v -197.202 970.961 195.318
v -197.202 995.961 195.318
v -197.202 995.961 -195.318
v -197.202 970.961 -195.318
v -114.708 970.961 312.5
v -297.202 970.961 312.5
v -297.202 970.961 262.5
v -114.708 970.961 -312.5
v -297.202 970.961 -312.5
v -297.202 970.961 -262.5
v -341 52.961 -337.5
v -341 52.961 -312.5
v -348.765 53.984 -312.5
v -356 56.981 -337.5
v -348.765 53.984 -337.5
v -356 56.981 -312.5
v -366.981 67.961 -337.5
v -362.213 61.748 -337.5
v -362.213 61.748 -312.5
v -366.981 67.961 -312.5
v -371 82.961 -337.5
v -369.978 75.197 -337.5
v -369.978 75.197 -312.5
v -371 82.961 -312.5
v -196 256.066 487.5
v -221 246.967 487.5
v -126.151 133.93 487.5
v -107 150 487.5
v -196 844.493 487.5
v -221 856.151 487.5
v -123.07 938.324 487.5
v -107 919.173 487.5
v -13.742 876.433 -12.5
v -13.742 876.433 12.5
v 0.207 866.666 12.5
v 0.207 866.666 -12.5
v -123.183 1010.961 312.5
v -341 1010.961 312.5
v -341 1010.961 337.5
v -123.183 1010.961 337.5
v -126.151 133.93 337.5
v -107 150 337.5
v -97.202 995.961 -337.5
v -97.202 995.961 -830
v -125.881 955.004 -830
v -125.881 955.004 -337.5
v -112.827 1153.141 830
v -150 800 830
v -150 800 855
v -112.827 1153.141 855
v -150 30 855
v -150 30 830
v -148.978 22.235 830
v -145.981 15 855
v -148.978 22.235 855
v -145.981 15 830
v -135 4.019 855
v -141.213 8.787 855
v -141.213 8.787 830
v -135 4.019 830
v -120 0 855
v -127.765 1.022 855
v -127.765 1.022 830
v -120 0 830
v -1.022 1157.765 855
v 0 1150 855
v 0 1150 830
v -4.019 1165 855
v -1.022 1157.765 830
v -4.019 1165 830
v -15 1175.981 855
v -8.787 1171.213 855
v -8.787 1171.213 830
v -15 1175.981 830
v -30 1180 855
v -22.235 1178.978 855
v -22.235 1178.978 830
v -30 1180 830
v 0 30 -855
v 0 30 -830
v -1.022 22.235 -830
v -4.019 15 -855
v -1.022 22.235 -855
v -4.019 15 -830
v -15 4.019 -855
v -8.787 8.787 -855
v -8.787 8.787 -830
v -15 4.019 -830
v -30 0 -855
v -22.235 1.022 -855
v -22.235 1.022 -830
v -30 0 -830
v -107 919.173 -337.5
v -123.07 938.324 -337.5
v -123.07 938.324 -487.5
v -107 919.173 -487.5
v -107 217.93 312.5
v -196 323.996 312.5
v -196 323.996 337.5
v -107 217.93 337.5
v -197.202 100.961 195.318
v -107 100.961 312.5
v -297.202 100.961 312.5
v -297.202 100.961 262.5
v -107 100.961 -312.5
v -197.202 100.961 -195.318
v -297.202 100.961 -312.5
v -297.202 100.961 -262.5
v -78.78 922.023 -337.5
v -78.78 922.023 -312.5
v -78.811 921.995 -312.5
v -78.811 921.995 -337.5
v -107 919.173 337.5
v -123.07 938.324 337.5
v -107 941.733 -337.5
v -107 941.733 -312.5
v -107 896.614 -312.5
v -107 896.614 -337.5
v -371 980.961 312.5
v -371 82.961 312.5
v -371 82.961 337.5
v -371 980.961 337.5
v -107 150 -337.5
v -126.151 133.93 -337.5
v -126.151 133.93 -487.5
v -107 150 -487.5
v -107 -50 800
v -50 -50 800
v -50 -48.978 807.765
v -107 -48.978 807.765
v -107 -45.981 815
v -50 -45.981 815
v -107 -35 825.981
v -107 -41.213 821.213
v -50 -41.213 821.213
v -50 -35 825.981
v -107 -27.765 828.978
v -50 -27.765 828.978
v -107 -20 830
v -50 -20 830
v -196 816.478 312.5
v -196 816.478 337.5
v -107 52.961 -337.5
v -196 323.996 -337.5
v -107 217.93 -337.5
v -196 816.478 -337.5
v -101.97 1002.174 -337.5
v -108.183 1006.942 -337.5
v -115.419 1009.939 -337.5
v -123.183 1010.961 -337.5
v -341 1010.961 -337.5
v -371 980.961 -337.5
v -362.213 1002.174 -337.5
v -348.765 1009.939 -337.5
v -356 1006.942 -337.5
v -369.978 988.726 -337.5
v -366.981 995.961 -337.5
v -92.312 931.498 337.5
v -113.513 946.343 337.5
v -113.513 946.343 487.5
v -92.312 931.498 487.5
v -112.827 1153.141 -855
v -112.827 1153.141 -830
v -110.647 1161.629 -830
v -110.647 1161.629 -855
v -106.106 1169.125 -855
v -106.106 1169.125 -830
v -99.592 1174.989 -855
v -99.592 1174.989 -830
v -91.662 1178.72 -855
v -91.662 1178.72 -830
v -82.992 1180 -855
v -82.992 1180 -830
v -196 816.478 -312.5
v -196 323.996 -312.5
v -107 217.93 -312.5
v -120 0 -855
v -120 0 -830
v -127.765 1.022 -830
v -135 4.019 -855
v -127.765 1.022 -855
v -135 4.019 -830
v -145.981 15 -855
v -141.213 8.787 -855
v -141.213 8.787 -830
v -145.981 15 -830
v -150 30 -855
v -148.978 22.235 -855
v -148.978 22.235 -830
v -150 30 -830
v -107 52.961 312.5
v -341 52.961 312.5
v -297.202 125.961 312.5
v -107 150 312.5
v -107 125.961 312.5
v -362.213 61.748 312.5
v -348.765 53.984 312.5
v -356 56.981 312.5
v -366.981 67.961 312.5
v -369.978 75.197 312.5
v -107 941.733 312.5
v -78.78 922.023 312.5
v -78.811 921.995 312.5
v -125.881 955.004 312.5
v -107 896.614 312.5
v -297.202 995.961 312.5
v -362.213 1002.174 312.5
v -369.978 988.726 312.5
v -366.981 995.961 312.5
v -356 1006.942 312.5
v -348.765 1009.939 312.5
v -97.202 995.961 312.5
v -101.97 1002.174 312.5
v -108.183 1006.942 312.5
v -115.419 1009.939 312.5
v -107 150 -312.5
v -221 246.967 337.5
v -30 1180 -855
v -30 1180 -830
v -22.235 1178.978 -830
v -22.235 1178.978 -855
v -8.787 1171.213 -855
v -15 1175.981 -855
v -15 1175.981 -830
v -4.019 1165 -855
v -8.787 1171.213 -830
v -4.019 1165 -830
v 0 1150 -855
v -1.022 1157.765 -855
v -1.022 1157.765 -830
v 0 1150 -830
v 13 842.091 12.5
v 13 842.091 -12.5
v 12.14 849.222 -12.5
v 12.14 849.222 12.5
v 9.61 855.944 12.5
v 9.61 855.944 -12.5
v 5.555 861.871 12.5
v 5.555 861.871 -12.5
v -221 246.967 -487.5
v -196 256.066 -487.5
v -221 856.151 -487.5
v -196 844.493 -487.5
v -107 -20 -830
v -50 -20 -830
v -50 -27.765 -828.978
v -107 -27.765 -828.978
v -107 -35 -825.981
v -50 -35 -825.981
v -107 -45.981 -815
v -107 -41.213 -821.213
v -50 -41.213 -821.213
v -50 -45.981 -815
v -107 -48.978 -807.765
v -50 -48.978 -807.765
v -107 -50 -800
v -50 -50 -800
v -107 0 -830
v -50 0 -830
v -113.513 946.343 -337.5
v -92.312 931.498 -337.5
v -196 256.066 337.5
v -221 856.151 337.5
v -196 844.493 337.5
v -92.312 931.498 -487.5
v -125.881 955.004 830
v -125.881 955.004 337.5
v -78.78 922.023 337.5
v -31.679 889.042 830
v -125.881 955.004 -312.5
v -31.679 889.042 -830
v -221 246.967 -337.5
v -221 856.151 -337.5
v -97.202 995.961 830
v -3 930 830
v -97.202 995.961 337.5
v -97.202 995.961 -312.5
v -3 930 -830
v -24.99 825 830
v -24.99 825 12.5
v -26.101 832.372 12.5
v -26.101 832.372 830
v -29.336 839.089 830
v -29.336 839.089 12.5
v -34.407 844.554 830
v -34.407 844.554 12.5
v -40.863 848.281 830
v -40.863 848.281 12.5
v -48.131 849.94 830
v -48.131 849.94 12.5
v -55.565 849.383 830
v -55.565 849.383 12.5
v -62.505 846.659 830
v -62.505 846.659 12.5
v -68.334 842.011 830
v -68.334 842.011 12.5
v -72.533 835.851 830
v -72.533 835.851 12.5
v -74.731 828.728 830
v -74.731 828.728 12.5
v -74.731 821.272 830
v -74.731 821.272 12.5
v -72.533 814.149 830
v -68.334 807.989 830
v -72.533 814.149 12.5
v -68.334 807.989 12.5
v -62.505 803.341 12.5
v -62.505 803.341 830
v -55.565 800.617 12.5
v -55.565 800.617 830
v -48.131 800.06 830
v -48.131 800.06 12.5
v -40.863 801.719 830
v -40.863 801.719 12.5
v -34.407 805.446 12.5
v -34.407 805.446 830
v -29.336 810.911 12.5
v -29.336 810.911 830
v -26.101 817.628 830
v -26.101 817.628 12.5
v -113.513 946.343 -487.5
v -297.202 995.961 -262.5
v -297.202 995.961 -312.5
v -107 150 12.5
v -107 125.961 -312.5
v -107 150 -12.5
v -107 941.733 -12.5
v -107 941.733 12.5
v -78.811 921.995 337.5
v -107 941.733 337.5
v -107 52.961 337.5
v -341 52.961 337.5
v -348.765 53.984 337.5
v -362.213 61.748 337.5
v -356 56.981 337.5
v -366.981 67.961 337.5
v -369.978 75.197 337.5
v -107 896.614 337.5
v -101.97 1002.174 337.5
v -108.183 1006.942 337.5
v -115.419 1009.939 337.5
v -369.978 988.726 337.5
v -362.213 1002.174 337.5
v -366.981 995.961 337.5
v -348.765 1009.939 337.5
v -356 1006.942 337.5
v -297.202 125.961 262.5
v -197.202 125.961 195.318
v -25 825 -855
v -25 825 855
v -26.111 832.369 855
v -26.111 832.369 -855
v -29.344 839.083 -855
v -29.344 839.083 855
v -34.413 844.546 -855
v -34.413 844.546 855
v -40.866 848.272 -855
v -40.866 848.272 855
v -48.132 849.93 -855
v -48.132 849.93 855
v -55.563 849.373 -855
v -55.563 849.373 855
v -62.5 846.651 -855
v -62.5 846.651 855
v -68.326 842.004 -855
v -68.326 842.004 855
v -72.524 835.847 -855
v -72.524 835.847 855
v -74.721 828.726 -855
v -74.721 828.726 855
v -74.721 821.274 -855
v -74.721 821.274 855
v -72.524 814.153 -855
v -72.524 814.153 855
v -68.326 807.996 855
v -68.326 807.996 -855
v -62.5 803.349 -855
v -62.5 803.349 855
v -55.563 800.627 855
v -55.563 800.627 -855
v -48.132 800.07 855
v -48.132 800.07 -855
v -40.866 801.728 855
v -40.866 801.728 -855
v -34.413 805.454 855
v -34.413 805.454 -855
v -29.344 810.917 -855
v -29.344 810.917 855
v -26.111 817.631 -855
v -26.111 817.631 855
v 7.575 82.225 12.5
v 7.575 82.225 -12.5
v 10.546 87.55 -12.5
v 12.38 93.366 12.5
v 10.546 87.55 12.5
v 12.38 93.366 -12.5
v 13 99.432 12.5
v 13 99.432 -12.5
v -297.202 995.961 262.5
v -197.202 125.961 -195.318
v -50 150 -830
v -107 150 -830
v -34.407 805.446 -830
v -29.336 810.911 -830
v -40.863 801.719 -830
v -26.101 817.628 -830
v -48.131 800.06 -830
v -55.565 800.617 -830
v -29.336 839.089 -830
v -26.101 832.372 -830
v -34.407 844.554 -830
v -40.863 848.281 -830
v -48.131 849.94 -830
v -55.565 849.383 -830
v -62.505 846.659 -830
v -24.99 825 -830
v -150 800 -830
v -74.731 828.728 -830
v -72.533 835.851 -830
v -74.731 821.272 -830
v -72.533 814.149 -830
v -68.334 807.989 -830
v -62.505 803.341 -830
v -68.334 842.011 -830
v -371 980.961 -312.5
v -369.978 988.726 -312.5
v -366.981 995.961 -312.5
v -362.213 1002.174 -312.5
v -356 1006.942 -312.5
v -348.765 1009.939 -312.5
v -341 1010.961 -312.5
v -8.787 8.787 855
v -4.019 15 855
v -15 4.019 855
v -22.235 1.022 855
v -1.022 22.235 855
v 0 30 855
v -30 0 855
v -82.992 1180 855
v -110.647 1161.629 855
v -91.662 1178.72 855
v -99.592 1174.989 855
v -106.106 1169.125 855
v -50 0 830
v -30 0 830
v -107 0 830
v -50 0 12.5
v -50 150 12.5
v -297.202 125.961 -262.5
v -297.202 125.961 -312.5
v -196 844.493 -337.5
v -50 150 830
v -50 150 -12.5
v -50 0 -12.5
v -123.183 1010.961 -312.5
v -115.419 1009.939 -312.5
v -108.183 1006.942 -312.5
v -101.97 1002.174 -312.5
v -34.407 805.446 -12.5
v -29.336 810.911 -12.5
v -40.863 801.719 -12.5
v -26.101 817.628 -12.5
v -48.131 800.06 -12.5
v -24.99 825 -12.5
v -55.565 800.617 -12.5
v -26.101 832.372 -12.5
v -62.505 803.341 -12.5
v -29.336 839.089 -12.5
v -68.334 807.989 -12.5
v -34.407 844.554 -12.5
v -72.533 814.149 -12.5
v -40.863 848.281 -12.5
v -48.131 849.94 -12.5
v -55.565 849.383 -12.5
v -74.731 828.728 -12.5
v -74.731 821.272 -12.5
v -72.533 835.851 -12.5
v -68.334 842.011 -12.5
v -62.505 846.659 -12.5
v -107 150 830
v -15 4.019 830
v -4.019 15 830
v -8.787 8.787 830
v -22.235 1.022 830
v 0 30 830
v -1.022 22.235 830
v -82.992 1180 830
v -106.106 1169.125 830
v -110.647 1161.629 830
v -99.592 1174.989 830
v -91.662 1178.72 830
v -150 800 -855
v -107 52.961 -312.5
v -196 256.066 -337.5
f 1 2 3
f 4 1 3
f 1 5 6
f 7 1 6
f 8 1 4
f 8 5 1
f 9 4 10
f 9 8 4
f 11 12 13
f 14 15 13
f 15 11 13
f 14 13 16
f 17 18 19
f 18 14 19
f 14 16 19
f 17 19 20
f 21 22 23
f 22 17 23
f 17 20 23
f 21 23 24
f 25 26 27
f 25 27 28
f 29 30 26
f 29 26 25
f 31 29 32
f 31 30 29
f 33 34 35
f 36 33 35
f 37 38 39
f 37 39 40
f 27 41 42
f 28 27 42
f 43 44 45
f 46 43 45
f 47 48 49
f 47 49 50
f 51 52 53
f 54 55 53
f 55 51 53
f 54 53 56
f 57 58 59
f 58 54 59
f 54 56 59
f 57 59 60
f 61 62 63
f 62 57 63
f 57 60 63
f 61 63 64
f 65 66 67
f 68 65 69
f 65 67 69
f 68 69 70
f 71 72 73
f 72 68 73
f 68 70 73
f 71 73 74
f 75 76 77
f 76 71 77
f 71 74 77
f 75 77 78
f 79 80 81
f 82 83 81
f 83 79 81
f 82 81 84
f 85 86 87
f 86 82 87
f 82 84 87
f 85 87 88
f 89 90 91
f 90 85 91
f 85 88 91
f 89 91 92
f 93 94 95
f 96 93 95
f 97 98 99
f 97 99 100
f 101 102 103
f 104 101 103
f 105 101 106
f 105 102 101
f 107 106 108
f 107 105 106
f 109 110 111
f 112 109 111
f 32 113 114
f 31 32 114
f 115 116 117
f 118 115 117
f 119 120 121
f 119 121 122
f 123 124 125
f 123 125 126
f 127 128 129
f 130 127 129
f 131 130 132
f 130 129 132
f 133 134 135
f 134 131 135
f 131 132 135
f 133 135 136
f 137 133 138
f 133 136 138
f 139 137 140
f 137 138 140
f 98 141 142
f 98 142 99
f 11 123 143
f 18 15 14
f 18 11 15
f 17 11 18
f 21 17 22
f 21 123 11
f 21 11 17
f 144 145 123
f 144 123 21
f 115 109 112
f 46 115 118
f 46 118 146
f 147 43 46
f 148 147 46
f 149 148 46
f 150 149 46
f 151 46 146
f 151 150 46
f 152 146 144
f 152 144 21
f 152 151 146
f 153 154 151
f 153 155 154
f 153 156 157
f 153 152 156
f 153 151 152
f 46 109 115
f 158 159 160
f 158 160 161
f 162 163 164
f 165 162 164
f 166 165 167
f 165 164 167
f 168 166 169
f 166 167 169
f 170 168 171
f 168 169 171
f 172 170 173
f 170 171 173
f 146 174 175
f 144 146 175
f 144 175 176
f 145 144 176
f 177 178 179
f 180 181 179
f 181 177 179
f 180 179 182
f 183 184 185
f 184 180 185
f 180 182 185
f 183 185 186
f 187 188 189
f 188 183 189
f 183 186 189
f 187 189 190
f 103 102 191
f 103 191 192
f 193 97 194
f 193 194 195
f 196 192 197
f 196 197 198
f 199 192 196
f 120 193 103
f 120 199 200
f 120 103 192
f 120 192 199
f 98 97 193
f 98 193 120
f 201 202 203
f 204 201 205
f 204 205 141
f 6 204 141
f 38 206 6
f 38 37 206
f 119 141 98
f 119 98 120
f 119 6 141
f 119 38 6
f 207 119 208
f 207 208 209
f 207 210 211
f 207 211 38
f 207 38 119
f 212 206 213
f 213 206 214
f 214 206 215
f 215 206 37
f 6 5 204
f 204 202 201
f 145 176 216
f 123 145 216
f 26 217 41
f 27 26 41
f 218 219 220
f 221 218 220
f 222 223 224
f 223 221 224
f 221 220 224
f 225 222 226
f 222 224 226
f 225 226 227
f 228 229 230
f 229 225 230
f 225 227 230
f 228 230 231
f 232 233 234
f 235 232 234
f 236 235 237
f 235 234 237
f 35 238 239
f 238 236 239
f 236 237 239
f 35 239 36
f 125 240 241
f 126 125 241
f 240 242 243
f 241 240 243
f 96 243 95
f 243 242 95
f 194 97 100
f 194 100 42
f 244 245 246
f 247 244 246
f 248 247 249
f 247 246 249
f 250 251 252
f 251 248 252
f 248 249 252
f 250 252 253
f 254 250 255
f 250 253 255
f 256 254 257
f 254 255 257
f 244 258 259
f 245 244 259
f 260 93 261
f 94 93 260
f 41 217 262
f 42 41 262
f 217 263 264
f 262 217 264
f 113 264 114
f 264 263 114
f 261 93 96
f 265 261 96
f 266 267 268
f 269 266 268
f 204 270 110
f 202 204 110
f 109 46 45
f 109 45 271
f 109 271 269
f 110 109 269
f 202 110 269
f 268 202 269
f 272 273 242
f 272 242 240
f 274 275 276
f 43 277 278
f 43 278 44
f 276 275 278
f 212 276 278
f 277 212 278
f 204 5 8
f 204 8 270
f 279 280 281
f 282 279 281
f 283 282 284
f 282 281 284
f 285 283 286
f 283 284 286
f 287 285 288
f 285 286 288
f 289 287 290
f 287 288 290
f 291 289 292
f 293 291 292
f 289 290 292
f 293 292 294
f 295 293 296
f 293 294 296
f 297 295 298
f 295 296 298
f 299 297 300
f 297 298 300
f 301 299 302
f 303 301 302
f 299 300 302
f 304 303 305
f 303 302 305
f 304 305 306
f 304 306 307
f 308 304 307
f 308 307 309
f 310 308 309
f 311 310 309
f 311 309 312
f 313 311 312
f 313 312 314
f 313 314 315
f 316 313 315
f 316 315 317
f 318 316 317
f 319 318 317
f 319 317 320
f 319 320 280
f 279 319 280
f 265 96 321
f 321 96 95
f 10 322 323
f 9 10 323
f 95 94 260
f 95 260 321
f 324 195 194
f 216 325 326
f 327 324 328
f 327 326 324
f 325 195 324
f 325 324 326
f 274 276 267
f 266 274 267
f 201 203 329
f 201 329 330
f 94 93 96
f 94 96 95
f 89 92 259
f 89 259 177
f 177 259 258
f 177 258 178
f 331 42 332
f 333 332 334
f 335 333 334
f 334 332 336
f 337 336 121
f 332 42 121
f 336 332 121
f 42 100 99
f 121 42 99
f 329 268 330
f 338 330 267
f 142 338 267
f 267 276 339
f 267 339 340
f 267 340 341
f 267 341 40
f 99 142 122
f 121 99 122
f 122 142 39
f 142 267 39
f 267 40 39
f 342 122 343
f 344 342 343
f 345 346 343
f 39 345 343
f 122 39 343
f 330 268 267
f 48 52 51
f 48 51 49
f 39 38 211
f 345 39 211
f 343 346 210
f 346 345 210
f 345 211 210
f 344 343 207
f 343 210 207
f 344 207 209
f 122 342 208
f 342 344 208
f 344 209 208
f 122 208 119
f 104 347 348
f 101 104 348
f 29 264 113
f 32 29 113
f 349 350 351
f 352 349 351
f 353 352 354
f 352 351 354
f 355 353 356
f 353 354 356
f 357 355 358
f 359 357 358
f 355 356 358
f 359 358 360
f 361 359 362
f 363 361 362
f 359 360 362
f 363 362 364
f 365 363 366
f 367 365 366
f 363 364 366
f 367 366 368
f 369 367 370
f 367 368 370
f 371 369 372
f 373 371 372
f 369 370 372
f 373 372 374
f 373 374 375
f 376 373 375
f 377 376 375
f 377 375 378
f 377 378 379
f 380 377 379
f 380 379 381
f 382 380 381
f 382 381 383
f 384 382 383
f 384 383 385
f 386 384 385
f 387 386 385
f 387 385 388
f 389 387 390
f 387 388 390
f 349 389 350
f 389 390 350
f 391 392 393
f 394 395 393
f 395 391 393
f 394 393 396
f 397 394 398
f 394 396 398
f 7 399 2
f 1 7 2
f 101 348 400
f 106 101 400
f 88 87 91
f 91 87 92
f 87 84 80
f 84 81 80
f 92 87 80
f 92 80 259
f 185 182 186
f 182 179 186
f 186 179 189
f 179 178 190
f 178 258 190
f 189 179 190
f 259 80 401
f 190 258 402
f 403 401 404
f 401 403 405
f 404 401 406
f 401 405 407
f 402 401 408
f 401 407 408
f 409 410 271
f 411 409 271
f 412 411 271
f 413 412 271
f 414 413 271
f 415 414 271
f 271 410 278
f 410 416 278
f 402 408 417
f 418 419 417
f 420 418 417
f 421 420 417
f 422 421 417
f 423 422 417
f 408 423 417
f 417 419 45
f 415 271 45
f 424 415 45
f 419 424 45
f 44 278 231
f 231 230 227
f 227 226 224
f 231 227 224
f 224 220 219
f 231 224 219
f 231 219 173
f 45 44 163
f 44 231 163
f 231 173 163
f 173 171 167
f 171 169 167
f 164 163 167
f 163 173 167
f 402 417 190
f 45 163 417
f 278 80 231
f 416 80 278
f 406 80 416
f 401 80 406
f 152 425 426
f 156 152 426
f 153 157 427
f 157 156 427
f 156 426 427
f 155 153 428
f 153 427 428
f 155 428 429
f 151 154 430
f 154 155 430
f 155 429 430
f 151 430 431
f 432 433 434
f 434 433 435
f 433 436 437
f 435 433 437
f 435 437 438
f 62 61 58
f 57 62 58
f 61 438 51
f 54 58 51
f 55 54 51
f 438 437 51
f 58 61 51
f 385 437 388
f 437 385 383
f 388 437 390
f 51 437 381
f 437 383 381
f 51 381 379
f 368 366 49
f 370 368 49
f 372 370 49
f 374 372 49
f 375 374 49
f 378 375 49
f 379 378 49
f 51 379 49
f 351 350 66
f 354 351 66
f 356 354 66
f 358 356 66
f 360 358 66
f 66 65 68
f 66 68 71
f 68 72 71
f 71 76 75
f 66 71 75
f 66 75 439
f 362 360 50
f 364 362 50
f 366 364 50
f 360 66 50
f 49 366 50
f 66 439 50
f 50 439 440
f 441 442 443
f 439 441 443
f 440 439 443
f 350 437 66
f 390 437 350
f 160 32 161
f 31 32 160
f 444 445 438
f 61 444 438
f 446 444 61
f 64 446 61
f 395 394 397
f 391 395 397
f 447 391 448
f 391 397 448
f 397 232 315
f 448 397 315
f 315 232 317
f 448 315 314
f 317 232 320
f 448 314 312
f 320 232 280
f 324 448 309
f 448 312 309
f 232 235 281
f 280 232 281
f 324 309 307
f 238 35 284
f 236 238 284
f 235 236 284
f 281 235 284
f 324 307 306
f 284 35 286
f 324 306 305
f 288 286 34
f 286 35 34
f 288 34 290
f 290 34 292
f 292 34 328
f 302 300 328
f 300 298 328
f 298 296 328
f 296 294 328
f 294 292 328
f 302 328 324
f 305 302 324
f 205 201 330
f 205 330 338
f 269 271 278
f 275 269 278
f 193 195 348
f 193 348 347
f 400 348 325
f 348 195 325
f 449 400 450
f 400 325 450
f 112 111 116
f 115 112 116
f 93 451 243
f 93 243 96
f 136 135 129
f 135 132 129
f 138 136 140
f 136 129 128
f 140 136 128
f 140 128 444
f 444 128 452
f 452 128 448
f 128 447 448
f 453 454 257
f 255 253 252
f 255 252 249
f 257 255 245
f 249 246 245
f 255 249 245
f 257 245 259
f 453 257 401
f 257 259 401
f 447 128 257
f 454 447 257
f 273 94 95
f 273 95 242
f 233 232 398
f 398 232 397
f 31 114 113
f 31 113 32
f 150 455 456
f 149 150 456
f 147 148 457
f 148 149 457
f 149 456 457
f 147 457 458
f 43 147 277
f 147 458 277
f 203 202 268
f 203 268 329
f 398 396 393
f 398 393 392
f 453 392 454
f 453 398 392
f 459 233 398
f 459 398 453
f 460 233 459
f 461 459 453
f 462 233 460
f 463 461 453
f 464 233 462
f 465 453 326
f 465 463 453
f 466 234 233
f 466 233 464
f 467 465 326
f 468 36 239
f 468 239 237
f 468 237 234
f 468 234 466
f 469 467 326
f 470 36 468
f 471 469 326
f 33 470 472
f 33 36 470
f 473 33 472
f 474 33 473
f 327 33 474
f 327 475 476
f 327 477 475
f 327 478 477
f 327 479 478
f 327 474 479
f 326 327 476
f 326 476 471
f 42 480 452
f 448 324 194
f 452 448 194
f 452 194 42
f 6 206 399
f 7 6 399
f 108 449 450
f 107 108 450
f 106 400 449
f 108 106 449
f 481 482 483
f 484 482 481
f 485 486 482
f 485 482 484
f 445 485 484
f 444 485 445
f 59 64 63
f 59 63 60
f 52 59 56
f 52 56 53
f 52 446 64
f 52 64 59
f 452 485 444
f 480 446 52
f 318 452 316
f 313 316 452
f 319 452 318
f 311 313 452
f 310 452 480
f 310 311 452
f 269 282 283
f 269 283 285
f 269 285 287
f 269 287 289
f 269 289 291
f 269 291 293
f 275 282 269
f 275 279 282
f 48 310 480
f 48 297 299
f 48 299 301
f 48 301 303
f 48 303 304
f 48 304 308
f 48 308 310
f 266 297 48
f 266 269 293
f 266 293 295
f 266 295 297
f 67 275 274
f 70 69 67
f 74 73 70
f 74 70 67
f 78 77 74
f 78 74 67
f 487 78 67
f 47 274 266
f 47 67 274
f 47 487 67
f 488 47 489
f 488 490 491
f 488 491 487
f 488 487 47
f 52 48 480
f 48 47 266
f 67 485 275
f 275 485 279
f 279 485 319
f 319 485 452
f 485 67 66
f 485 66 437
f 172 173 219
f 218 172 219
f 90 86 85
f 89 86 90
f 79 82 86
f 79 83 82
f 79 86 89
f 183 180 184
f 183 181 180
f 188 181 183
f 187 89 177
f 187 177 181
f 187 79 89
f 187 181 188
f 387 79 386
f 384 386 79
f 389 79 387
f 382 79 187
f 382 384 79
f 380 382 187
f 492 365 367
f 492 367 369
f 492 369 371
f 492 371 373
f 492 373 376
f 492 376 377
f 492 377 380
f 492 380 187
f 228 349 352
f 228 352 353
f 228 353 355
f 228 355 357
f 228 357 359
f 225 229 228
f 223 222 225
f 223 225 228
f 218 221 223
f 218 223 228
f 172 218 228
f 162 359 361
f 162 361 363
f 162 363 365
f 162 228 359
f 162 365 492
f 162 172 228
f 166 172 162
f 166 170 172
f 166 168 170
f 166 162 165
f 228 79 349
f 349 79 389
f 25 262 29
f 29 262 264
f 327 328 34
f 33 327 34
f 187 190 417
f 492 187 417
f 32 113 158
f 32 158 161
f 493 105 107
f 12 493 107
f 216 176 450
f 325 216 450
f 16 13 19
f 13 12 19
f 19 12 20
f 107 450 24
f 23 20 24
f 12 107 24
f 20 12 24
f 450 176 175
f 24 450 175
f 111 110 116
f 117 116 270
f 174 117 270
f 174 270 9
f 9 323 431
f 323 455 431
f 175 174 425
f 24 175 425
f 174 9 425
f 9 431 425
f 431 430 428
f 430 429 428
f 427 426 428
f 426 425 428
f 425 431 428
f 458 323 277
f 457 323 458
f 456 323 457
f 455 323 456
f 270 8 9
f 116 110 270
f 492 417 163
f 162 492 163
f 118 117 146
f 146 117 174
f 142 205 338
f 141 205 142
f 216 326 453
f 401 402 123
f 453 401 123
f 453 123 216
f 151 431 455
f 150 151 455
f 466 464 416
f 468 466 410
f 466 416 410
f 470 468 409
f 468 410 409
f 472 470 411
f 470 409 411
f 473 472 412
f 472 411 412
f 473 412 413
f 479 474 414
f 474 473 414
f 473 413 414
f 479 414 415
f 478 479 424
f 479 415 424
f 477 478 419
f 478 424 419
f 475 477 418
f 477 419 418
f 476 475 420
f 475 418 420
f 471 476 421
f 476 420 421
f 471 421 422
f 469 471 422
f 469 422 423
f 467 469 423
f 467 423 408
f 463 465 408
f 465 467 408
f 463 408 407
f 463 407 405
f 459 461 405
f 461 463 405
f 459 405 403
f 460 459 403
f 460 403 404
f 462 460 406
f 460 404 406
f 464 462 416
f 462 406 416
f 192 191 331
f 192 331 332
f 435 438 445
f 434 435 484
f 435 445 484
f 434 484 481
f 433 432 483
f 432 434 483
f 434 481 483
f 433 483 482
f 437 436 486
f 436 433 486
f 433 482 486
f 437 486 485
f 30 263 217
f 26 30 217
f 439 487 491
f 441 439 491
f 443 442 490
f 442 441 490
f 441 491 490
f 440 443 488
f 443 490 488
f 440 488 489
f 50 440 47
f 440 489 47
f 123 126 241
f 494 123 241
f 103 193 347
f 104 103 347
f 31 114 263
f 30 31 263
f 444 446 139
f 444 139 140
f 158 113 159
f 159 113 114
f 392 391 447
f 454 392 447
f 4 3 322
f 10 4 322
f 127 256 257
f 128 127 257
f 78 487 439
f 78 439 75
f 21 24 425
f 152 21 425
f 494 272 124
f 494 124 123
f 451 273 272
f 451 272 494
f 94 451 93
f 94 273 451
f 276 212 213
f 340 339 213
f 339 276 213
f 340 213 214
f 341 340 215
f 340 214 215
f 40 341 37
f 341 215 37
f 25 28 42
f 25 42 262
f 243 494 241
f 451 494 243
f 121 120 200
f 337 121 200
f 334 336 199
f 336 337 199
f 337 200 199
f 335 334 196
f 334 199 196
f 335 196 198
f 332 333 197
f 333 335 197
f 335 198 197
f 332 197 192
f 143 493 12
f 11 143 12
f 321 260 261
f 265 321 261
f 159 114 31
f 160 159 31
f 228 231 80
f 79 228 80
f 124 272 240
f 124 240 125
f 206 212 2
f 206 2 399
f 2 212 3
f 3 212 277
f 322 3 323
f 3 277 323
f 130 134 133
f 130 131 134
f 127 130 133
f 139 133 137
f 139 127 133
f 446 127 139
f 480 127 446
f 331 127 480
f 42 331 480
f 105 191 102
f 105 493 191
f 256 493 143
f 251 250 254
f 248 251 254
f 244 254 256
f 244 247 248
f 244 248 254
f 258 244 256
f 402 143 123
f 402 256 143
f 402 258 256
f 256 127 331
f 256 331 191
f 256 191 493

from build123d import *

# Parameters (mm, degrees)
BOSS_EXTRUDE1_START = 830
BOSS_EXTRUDE1_DEPTH = 25
BOSS_EXTRUDE2_START = -830
BOSS_EXTRUDE2_DEPTH = 25
SKETCH2_W           = 57
SKETCH2_H           = 200
BOSS_EXTRUDE3_DEPTH = 1660
BOSS_EXTRUDE4_DEPTH = 12.5
SKETCH4_R           = 25
CUT_EXTRUDE1_DEPTH  = 2084.026644093
BOSS_EXTRUDE5_START = -1685
SKETCH5_R           = 25.01
SKETCH5_R_2         = 25
BOSS_EXTRUDE5_DEPTH = 1660
BOSS_EXTRUDE6_START = 300
BOSS_EXTRUDE6_DEPTH = 25
EXTRUDE_THIN1_DEPTH = 150
BOSS_EXTRUDE7_REACH = 1429.345
SKETCH9_W           = 150
SKETCH9_H           = 25
BOSS_EXTRUDE8_DEPTH = 25
LPATTERN1_COUNT     = 2
LPATTERN1_PITCH     = 870
FILLET1_R           = 30


with BuildPart() as part:
    # Sketch1 → Boss-Extrude1 (new body)
    with BuildSketch(Plane.XY.offset(BOSS_EXTRUDE1_START)):
        Polygon((0, 1180), (0, 0), (-150, 0), (-150, 800), (-110, 1180), align=None)
    extrude(amount=BOSS_EXTRUDE1_DEPTH)



with BuildPart() as body_2:
    # Sketch1<2> → Boss-Extrude2 (new body)
    with BuildSketch(Plane.XY.offset(BOSS_EXTRUDE2_START)):
        Polygon((0, 1180), (0, 0), (-150, 0), (-150, 800), (-110, 1180), align=None)
    extrude(amount=-BOSS_EXTRUDE2_DEPTH)


with BuildPart() as part_1:
    add(part.part)

    add(body_2.part)  # Boss-Extrude3 merges body 2
    # Sketch2 → Boss-Extrude3 (add)
    with BuildSketch(Plane.XY.offset(-830)):
        Polygon((-3, 930), (-97.202485093, 995.96129018), (-125.881306911, 955.003687966), (-31.678821818, 889.042397786), align=None)
        with Locations((-78.5, 50)):
            Rectangle(SKETCH2_W, SKETCH2_H)
    extrude(amount=BOSS_EXTRUDE3_DEPTH)

    # Sketch3 → Boss-Extrude4 (add, symmetric)
    with BuildSketch(Plane.XY):
        Polygon((-107, 941.732958314), (-13.742380871, 876.433270404), (13, 857.708053729), (13, 89.973324425), (-50, 0), (-50, 150), (-107, 150), align=None)
    extrude(amount=BOSS_EXTRUDE4_DEPTH, both=True)

    # Sketch4 → Cut-Extrude1 (cut, through all)
    with BuildSketch(Plane.XY.offset(855)):
        with Locations((-50, 825)):
            Circle(SKETCH4_R)
    extrude(amount=-CUT_EXTRUDE1_DEPTH, mode=Mode.SUBTRACT)

    # Sketch5 → Boss-Extrude5 (add)
    with BuildSketch(Plane.XY.offset(855).offset(BOSS_EXTRUDE5_START)):
        with Locations((-50, 825)):
            Circle(SKETCH5_R)
        with Locations((-50, 825)):
            Circle(SKETCH5_R_2, mode=Mode.SUBTRACT)
    extrude(amount=BOSS_EXTRUDE5_DEPTH)

    # Sketch7 → Boss-Extrude6 (add)
    with BuildSketch(Plane(origin=(0, 0, -12.5), x_dir=(-1, 0, 0), z_dir=(0, 0, -1)).offset(BOSS_EXTRUDE6_START)):
        Polygon((97.202485093, 995.96129018), (125.881306911, 955.003687966), (78.780064364, 922.023042876), (78.811237587, 921.99497438), (107, 941.732958314), (107, 896.613698699), (196, 816.477738757), (196, 323.996024519), (107, 217.929954778), (107, 150), (107, 52.96129018), (371, 52.96129018), (371, 1010.96129018), (97.202485093, 1010.96129018), align=None)
    extrude(amount=BOSS_EXTRUDE6_DEPTH)


with BuildPart() as body_2_2:
    # Sketch8 → Extrude-Thin1 (new body)
    with BuildSketch(Plane(origin=(0, 0, -337.5), x_dir=(-1, 0, 0), z_dir=(0, 0, -1))):
        Polygon((107, 150), (196, 256.066069741), (196, 844.493461332), (107, 919.173328507), (123.069690242, 938.324439585), (221, 856.151152786), (221, 246.966813884), (126.151111078, 133.930309758), align=None)
    extrude(amount=EXTRUDE_THIN1_DEPTH)


with BuildPart() as body_3:
    # Boss-Extrude7: up to this plane
    boss_extrude7_end = Plane(origin=(-31.678821818, 889.042397786, 1037.963939182), z_dir=(0.5735764363510437, 0.8191520442889936, 0))
    # Sketch9 → Boss-Extrude7 (new, up to the surface)
    with BuildSketch(Plane(origin=(389.814332632, 327.09306274, 0), x_dir=(0, 0, -1), z_dir=(0.7660444431189808, 0.6427876096865363, 0)), mode=Mode.PRIVATE) as boss_extrude7_sk1:
        with Locations((412.5, 785.405894802)):
            Rectangle(SKETCH9_W, SKETCH9_H)
    boss_extrude7_tool1 = split(extrude(boss_extrude7_sk1.sketch, amount=BOSS_EXTRUDE7_REACH, mode=Mode.PRIVATE), bisect_by=boss_extrude7_end, keep=Keep.BOTH, mode=Mode.PRIVATE)
    add(boss_extrude7_tool1.solids().sort_by_distance((-115.034845, 928.748884, -412.5))[0])


with BuildPart() as body_4:
    # Mirror4: mirrored copy
    add(body_2_2.part.mirror(Plane.XY))


with BuildPart() as body_5:
    # Mirror4 2: mirrored copy
    add(body_3.part.mirror(Plane.XY))


with BuildPart() as body_6:
    # Mirror4 3: mirrored copy
    add(part_1.part.mirror(Plane.XY))


with BuildPart() as part_2:
    add(part_1.part)

    add(body_6.part)  # Boss-Extrude8 merges body 6
    # Sketch11 → Boss-Extrude8 (add)
    with BuildSketch(Plane(origin=(0, 995.96129018, 0), x_dir=(1, 0, 0), z_dir=(0, 1, 0))):
        Polygon((-297.202485093, 312.5), (-97.202485093, 312.5), (-97.202485093, -312.5), (-297.202485093, -312.5), (-297.202485093, -262.5), (-197.202485093, -195.317845765), (-197.202485093, 195.317845765), (-297.202485093, 262.5), align=None)
    boss_extrude8 = extrude(amount=-BOSS_EXTRUDE8_DEPTH)

    # LPattern1: Boss-Extrude8 ×2
    with Locations(*[(0, -i * LPATTERN1_PITCH, 0) for i in range(1, LPATTERN1_COUNT)]):
        add(boss_extrude8)

    # Fillet1
    # the kernel refuses this fillet: 30 mm, written as the material it takes off along each edge
    with BuildSketch(Plane(origin=(0, 1180, 755), x_dir=(-1, 0, 0), z_dir=(0, 0, 1)), Plane(origin=(0, 0, 755), x_dir=(0, 1, 0), z_dir=(0, 0, 1)), Plane(origin=(0, 1180, -755), x_dir=(0, -1, 0), z_dir=(0, 0, -1)), Plane(origin=(-371, 1010.96129018, -237.5), x_dir=(1, 0, 0), z_dir=(0, 0, -1)), Plane(origin=(-371, 1010.96129018, 237.5), x_dir=(0, -1, 0), z_dir=(0, 0, 1)), Plane(origin=(-371, 52.96129018, 237.5), x_dir=(1, 0, 0), z_dir=(0, 0, 1))) as fillet1_piece_1:
        with BuildLine():
            CenterArc((FILLET1_R, FILLET1_R), FILLET1_R, 180, 90)
            Line((0, FILLET1_R), (-FILLET1_R * 0.02, FILLET1_R))
            Line((-FILLET1_R * 0.02, FILLET1_R), (-FILLET1_R * 0.02, -FILLET1_R * 0.02))
            Line((-FILLET1_R * 0.02, -FILLET1_R * 0.02), (FILLET1_R, -FILLET1_R * 0.02))
            Line((FILLET1_R, -FILLET1_R * 0.02), (FILLET1_R, 0))
        make_face()
    extrude(amount=175, mode=Mode.SUBTRACT)
    with BuildSketch(Plane(origin=(-110, 1180, 762.480369048), x_dir=(1, 0, 0), z_dir=(0, 0, 1))) as fillet1_piece_2:
        with BuildLine():
            CenterArc((FILLET1_R * 0.900261746029, -FILLET1_R), FILLET1_R, 90, 83.990994043)
            Line((-FILLET1_R * 0.0942437068928, -FILLET1_R * 0.895315215482), (-FILLET1_R * 0.114133815951, -FILLET1_R * 0.893221519792))
            Line((-FILLET1_R * 0.114133815951, -FILLET1_R * 0.893221519792), (-FILLET1_R * 0.0180052349206, FILLET1_R * 0.02))
            Line((-FILLET1_R * 0.0180052349206, FILLET1_R * 0.02), (FILLET1_R * 0.900261746029, FILLET1_R * 0.02))
            Line((FILLET1_R * 0.900261746029, FILLET1_R * 0.02), (FILLET1_R * 0.900261746029, 0))
        make_face()
    extrude(amount=160.039261904, mode=Mode.SUBTRACT)
    with BuildSketch(Plane(origin=(-150, 0, 755), x_dir=(0, 1, 0), z_dir=(0, 0, 1)), Plane(origin=(0, 0, -755), x_dir=(0, 1, 0), z_dir=(0, 0, -1)), Plane(origin=(-150, 0, -755), x_dir=(1, 0, 0), z_dir=(0, 0, -1)), Plane(origin=(-371, 52.96129018, -237.5), x_dir=(1, 0, 0), z_dir=(0, 0, -1))) as fillet1_piece_3:
        with BuildLine():
            CenterArc((FILLET1_R, -FILLET1_R), FILLET1_R, 90, 90)
            Line((0, -FILLET1_R), (-FILLET1_R * 0.02, -FILLET1_R))
            Line((-FILLET1_R * 0.02, -FILLET1_R), (-FILLET1_R * 0.02, FILLET1_R * 0.02))
            Line((-FILLET1_R * 0.02, FILLET1_R * 0.02), (FILLET1_R, FILLET1_R * 0.02))
            Line((FILLET1_R, FILLET1_R * 0.02), (FILLET1_R, 0))
        make_face()
    extrude(amount=175, mode=Mode.SUBTRACT)
    with BuildSketch(Plane(origin=(25, -50, 830), x_dir=(0, 0, -1), z_dir=(-1, 0, 0)), Plane(origin=(25, -50, -830), x_dir=(0, 1, 0), z_dir=(-1, 0, 0))) as fillet1_piece_4:
        with BuildLine():
            CenterArc((FILLET1_R, -FILLET1_R), FILLET1_R, 90, 90)
            Line((0, -FILLET1_R), (-FILLET1_R * 0.02, -FILLET1_R))
            Line((-FILLET1_R * 0.02, -FILLET1_R), (-FILLET1_R * 0.02, FILLET1_R * 0.02))
            Line((-FILLET1_R * 0.02, FILLET1_R * 0.02), (FILLET1_R, FILLET1_R * 0.02))
            Line((FILLET1_R, FILLET1_R * 0.02), (FILLET1_R, 0))
        make_face()
    extrude(amount=207, mode=Mode.SUBTRACT)
    with BuildSketch(Plane(origin=(13, 857.708053729, -51.542528791), x_dir=(-0.8191520442889964, 0.5735764363510396, 0), z_dir=(0, 0, 1))) as fillet1_piece_5:
        with BuildLine():
            CenterArc((FILLET1_R * 0.520567050552, FILLET1_R), FILLET1_R, 215, 55)
            Line((-FILLET1_R * 0.298584993737, FILLET1_R * 0.426423563649), (-FILLET1_R * 0.314968034623, FILLET1_R * 0.414952034922))
            Line((-FILLET1_R * 0.314968034623, FILLET1_R * 0.414952034922), (-FILLET1_R * 0.010411341011, -FILLET1_R * 0.02))
            Line((-FILLET1_R * 0.010411341011, -FILLET1_R * 0.02), (FILLET1_R * 0.520567050552, -FILLET1_R * 0.02))
            Line((FILLET1_R * 0.520567050552, -FILLET1_R * 0.02), (FILLET1_R * 0.520567050552, 0))
        make_face()
    extrude(amount=103.085057583, mode=Mode.SUBTRACT)
    with BuildSketch(Plane(origin=(13, 89.973324425, -36.147409166), x_dir=(-0.5735764363510505, -0.8191520442889888, 0), z_dir=(0, 0, 1))) as fillet1_piece_6:
        with BuildLine():
            CenterArc((FILLET1_R * 0.315298788879, -FILLET1_R), FILLET1_R, 90, 35)
            Line((-FILLET1_R * 0.258277647472, -FILLET1_R * 0.180847955711), (-FILLET1_R * 0.269749176199, -FILLET1_R * 0.164464914825))
            Line((-FILLET1_R * 0.269749176199, -FILLET1_R * 0.164464914825), (-FILLET1_R * 0.00630597577758, FILLET1_R * 0.02))
            Line((-FILLET1_R * 0.00630597577758, FILLET1_R * 0.02), (FILLET1_R * 0.315298788879, FILLET1_R * 0.02))
            Line((FILLET1_R * 0.315298788879, FILLET1_R * 0.02), (FILLET1_R * 0.315298788879, 0))
        make_face()
    extrude(amount=72.294818332, mode=Mode.SUBTRACT)
    with BuildSketch(Plane(origin=(-110, 1180, -762.480369048), x_dir=(1, 0, 0), z_dir=(0, 0, -1))) as fillet1_piece_7:
        with BuildLine():
            CenterArc((FILLET1_R * 0.900261746029, FILLET1_R), FILLET1_R, 186.009005957, 83.990994043)
            Line((-FILLET1_R * 0.0942437068928, FILLET1_R * 0.895315215482), (-FILLET1_R * 0.114133815951, FILLET1_R * 0.893221519792))
            Line((-FILLET1_R * 0.114133815951, FILLET1_R * 0.893221519792), (-FILLET1_R * 0.0180052349206, -FILLET1_R * 0.02))
            Line((-FILLET1_R * 0.0180052349206, -FILLET1_R * 0.02), (FILLET1_R * 0.900261746029, -FILLET1_R * 0.02))
            Line((FILLET1_R * 0.900261746029, -FILLET1_R * 0.02), (FILLET1_R * 0.900261746029, 0))
        make_face()
    extrude(amount=160.039261904, mode=Mode.SUBTRACT)
    with BuildSketch(Plane(origin=(-97.202485093, 1010.96129018, -247.548094716), x_dir=(0, -1, 0), z_dir=(0, 0, -1))) as fillet1_piece_8:
        with BuildLine():
            CenterArc((30, 25.980762114), FILLET1_R, 180, 60)
            Line((0, 25.980762114), (-0.6, 25.980762114))
            Line((-0.6, 25.980762114), (-0.6, 0))
            Line((-0.6, 0), (0, -0.6))
            ThreePointArc((0, -0.6), (7.5, -0.6), (14.7, -0.519615242))
            Line((14.7, -0.519615242), (15, 0))
        make_face()
    extrude(amount=154.903810568, mode=Mode.SUBTRACT)
    with BuildSketch(Plane(origin=(-97.202485093, 1010.96129018, 247.548094716), x_dir=(0, -1, 0), z_dir=(0, 0, 1))) as fillet1_piece_9:
        with BuildLine():
            CenterArc((30, -25.980762114), FILLET1_R, 120, 60)
            Line((0, -25.980762114), (-0.6, -25.980762114))
            Line((-0.6, -25.980762114), (-0.6, 0))
            Line((-0.6, 0), (0, 0.6))
            ThreePointArc((0, 0.6), (7.5, 0.6), (14.7, 0.519615242))
            Line((14.7, 0.519615242), (15, 0))
        make_face()
    extrude(amount=154.903810568, mode=Mode.SUBTRACT)


solid = Compound([body_2_2.part, body_3.part, body_4.part, body_5.part, part_2.part])
